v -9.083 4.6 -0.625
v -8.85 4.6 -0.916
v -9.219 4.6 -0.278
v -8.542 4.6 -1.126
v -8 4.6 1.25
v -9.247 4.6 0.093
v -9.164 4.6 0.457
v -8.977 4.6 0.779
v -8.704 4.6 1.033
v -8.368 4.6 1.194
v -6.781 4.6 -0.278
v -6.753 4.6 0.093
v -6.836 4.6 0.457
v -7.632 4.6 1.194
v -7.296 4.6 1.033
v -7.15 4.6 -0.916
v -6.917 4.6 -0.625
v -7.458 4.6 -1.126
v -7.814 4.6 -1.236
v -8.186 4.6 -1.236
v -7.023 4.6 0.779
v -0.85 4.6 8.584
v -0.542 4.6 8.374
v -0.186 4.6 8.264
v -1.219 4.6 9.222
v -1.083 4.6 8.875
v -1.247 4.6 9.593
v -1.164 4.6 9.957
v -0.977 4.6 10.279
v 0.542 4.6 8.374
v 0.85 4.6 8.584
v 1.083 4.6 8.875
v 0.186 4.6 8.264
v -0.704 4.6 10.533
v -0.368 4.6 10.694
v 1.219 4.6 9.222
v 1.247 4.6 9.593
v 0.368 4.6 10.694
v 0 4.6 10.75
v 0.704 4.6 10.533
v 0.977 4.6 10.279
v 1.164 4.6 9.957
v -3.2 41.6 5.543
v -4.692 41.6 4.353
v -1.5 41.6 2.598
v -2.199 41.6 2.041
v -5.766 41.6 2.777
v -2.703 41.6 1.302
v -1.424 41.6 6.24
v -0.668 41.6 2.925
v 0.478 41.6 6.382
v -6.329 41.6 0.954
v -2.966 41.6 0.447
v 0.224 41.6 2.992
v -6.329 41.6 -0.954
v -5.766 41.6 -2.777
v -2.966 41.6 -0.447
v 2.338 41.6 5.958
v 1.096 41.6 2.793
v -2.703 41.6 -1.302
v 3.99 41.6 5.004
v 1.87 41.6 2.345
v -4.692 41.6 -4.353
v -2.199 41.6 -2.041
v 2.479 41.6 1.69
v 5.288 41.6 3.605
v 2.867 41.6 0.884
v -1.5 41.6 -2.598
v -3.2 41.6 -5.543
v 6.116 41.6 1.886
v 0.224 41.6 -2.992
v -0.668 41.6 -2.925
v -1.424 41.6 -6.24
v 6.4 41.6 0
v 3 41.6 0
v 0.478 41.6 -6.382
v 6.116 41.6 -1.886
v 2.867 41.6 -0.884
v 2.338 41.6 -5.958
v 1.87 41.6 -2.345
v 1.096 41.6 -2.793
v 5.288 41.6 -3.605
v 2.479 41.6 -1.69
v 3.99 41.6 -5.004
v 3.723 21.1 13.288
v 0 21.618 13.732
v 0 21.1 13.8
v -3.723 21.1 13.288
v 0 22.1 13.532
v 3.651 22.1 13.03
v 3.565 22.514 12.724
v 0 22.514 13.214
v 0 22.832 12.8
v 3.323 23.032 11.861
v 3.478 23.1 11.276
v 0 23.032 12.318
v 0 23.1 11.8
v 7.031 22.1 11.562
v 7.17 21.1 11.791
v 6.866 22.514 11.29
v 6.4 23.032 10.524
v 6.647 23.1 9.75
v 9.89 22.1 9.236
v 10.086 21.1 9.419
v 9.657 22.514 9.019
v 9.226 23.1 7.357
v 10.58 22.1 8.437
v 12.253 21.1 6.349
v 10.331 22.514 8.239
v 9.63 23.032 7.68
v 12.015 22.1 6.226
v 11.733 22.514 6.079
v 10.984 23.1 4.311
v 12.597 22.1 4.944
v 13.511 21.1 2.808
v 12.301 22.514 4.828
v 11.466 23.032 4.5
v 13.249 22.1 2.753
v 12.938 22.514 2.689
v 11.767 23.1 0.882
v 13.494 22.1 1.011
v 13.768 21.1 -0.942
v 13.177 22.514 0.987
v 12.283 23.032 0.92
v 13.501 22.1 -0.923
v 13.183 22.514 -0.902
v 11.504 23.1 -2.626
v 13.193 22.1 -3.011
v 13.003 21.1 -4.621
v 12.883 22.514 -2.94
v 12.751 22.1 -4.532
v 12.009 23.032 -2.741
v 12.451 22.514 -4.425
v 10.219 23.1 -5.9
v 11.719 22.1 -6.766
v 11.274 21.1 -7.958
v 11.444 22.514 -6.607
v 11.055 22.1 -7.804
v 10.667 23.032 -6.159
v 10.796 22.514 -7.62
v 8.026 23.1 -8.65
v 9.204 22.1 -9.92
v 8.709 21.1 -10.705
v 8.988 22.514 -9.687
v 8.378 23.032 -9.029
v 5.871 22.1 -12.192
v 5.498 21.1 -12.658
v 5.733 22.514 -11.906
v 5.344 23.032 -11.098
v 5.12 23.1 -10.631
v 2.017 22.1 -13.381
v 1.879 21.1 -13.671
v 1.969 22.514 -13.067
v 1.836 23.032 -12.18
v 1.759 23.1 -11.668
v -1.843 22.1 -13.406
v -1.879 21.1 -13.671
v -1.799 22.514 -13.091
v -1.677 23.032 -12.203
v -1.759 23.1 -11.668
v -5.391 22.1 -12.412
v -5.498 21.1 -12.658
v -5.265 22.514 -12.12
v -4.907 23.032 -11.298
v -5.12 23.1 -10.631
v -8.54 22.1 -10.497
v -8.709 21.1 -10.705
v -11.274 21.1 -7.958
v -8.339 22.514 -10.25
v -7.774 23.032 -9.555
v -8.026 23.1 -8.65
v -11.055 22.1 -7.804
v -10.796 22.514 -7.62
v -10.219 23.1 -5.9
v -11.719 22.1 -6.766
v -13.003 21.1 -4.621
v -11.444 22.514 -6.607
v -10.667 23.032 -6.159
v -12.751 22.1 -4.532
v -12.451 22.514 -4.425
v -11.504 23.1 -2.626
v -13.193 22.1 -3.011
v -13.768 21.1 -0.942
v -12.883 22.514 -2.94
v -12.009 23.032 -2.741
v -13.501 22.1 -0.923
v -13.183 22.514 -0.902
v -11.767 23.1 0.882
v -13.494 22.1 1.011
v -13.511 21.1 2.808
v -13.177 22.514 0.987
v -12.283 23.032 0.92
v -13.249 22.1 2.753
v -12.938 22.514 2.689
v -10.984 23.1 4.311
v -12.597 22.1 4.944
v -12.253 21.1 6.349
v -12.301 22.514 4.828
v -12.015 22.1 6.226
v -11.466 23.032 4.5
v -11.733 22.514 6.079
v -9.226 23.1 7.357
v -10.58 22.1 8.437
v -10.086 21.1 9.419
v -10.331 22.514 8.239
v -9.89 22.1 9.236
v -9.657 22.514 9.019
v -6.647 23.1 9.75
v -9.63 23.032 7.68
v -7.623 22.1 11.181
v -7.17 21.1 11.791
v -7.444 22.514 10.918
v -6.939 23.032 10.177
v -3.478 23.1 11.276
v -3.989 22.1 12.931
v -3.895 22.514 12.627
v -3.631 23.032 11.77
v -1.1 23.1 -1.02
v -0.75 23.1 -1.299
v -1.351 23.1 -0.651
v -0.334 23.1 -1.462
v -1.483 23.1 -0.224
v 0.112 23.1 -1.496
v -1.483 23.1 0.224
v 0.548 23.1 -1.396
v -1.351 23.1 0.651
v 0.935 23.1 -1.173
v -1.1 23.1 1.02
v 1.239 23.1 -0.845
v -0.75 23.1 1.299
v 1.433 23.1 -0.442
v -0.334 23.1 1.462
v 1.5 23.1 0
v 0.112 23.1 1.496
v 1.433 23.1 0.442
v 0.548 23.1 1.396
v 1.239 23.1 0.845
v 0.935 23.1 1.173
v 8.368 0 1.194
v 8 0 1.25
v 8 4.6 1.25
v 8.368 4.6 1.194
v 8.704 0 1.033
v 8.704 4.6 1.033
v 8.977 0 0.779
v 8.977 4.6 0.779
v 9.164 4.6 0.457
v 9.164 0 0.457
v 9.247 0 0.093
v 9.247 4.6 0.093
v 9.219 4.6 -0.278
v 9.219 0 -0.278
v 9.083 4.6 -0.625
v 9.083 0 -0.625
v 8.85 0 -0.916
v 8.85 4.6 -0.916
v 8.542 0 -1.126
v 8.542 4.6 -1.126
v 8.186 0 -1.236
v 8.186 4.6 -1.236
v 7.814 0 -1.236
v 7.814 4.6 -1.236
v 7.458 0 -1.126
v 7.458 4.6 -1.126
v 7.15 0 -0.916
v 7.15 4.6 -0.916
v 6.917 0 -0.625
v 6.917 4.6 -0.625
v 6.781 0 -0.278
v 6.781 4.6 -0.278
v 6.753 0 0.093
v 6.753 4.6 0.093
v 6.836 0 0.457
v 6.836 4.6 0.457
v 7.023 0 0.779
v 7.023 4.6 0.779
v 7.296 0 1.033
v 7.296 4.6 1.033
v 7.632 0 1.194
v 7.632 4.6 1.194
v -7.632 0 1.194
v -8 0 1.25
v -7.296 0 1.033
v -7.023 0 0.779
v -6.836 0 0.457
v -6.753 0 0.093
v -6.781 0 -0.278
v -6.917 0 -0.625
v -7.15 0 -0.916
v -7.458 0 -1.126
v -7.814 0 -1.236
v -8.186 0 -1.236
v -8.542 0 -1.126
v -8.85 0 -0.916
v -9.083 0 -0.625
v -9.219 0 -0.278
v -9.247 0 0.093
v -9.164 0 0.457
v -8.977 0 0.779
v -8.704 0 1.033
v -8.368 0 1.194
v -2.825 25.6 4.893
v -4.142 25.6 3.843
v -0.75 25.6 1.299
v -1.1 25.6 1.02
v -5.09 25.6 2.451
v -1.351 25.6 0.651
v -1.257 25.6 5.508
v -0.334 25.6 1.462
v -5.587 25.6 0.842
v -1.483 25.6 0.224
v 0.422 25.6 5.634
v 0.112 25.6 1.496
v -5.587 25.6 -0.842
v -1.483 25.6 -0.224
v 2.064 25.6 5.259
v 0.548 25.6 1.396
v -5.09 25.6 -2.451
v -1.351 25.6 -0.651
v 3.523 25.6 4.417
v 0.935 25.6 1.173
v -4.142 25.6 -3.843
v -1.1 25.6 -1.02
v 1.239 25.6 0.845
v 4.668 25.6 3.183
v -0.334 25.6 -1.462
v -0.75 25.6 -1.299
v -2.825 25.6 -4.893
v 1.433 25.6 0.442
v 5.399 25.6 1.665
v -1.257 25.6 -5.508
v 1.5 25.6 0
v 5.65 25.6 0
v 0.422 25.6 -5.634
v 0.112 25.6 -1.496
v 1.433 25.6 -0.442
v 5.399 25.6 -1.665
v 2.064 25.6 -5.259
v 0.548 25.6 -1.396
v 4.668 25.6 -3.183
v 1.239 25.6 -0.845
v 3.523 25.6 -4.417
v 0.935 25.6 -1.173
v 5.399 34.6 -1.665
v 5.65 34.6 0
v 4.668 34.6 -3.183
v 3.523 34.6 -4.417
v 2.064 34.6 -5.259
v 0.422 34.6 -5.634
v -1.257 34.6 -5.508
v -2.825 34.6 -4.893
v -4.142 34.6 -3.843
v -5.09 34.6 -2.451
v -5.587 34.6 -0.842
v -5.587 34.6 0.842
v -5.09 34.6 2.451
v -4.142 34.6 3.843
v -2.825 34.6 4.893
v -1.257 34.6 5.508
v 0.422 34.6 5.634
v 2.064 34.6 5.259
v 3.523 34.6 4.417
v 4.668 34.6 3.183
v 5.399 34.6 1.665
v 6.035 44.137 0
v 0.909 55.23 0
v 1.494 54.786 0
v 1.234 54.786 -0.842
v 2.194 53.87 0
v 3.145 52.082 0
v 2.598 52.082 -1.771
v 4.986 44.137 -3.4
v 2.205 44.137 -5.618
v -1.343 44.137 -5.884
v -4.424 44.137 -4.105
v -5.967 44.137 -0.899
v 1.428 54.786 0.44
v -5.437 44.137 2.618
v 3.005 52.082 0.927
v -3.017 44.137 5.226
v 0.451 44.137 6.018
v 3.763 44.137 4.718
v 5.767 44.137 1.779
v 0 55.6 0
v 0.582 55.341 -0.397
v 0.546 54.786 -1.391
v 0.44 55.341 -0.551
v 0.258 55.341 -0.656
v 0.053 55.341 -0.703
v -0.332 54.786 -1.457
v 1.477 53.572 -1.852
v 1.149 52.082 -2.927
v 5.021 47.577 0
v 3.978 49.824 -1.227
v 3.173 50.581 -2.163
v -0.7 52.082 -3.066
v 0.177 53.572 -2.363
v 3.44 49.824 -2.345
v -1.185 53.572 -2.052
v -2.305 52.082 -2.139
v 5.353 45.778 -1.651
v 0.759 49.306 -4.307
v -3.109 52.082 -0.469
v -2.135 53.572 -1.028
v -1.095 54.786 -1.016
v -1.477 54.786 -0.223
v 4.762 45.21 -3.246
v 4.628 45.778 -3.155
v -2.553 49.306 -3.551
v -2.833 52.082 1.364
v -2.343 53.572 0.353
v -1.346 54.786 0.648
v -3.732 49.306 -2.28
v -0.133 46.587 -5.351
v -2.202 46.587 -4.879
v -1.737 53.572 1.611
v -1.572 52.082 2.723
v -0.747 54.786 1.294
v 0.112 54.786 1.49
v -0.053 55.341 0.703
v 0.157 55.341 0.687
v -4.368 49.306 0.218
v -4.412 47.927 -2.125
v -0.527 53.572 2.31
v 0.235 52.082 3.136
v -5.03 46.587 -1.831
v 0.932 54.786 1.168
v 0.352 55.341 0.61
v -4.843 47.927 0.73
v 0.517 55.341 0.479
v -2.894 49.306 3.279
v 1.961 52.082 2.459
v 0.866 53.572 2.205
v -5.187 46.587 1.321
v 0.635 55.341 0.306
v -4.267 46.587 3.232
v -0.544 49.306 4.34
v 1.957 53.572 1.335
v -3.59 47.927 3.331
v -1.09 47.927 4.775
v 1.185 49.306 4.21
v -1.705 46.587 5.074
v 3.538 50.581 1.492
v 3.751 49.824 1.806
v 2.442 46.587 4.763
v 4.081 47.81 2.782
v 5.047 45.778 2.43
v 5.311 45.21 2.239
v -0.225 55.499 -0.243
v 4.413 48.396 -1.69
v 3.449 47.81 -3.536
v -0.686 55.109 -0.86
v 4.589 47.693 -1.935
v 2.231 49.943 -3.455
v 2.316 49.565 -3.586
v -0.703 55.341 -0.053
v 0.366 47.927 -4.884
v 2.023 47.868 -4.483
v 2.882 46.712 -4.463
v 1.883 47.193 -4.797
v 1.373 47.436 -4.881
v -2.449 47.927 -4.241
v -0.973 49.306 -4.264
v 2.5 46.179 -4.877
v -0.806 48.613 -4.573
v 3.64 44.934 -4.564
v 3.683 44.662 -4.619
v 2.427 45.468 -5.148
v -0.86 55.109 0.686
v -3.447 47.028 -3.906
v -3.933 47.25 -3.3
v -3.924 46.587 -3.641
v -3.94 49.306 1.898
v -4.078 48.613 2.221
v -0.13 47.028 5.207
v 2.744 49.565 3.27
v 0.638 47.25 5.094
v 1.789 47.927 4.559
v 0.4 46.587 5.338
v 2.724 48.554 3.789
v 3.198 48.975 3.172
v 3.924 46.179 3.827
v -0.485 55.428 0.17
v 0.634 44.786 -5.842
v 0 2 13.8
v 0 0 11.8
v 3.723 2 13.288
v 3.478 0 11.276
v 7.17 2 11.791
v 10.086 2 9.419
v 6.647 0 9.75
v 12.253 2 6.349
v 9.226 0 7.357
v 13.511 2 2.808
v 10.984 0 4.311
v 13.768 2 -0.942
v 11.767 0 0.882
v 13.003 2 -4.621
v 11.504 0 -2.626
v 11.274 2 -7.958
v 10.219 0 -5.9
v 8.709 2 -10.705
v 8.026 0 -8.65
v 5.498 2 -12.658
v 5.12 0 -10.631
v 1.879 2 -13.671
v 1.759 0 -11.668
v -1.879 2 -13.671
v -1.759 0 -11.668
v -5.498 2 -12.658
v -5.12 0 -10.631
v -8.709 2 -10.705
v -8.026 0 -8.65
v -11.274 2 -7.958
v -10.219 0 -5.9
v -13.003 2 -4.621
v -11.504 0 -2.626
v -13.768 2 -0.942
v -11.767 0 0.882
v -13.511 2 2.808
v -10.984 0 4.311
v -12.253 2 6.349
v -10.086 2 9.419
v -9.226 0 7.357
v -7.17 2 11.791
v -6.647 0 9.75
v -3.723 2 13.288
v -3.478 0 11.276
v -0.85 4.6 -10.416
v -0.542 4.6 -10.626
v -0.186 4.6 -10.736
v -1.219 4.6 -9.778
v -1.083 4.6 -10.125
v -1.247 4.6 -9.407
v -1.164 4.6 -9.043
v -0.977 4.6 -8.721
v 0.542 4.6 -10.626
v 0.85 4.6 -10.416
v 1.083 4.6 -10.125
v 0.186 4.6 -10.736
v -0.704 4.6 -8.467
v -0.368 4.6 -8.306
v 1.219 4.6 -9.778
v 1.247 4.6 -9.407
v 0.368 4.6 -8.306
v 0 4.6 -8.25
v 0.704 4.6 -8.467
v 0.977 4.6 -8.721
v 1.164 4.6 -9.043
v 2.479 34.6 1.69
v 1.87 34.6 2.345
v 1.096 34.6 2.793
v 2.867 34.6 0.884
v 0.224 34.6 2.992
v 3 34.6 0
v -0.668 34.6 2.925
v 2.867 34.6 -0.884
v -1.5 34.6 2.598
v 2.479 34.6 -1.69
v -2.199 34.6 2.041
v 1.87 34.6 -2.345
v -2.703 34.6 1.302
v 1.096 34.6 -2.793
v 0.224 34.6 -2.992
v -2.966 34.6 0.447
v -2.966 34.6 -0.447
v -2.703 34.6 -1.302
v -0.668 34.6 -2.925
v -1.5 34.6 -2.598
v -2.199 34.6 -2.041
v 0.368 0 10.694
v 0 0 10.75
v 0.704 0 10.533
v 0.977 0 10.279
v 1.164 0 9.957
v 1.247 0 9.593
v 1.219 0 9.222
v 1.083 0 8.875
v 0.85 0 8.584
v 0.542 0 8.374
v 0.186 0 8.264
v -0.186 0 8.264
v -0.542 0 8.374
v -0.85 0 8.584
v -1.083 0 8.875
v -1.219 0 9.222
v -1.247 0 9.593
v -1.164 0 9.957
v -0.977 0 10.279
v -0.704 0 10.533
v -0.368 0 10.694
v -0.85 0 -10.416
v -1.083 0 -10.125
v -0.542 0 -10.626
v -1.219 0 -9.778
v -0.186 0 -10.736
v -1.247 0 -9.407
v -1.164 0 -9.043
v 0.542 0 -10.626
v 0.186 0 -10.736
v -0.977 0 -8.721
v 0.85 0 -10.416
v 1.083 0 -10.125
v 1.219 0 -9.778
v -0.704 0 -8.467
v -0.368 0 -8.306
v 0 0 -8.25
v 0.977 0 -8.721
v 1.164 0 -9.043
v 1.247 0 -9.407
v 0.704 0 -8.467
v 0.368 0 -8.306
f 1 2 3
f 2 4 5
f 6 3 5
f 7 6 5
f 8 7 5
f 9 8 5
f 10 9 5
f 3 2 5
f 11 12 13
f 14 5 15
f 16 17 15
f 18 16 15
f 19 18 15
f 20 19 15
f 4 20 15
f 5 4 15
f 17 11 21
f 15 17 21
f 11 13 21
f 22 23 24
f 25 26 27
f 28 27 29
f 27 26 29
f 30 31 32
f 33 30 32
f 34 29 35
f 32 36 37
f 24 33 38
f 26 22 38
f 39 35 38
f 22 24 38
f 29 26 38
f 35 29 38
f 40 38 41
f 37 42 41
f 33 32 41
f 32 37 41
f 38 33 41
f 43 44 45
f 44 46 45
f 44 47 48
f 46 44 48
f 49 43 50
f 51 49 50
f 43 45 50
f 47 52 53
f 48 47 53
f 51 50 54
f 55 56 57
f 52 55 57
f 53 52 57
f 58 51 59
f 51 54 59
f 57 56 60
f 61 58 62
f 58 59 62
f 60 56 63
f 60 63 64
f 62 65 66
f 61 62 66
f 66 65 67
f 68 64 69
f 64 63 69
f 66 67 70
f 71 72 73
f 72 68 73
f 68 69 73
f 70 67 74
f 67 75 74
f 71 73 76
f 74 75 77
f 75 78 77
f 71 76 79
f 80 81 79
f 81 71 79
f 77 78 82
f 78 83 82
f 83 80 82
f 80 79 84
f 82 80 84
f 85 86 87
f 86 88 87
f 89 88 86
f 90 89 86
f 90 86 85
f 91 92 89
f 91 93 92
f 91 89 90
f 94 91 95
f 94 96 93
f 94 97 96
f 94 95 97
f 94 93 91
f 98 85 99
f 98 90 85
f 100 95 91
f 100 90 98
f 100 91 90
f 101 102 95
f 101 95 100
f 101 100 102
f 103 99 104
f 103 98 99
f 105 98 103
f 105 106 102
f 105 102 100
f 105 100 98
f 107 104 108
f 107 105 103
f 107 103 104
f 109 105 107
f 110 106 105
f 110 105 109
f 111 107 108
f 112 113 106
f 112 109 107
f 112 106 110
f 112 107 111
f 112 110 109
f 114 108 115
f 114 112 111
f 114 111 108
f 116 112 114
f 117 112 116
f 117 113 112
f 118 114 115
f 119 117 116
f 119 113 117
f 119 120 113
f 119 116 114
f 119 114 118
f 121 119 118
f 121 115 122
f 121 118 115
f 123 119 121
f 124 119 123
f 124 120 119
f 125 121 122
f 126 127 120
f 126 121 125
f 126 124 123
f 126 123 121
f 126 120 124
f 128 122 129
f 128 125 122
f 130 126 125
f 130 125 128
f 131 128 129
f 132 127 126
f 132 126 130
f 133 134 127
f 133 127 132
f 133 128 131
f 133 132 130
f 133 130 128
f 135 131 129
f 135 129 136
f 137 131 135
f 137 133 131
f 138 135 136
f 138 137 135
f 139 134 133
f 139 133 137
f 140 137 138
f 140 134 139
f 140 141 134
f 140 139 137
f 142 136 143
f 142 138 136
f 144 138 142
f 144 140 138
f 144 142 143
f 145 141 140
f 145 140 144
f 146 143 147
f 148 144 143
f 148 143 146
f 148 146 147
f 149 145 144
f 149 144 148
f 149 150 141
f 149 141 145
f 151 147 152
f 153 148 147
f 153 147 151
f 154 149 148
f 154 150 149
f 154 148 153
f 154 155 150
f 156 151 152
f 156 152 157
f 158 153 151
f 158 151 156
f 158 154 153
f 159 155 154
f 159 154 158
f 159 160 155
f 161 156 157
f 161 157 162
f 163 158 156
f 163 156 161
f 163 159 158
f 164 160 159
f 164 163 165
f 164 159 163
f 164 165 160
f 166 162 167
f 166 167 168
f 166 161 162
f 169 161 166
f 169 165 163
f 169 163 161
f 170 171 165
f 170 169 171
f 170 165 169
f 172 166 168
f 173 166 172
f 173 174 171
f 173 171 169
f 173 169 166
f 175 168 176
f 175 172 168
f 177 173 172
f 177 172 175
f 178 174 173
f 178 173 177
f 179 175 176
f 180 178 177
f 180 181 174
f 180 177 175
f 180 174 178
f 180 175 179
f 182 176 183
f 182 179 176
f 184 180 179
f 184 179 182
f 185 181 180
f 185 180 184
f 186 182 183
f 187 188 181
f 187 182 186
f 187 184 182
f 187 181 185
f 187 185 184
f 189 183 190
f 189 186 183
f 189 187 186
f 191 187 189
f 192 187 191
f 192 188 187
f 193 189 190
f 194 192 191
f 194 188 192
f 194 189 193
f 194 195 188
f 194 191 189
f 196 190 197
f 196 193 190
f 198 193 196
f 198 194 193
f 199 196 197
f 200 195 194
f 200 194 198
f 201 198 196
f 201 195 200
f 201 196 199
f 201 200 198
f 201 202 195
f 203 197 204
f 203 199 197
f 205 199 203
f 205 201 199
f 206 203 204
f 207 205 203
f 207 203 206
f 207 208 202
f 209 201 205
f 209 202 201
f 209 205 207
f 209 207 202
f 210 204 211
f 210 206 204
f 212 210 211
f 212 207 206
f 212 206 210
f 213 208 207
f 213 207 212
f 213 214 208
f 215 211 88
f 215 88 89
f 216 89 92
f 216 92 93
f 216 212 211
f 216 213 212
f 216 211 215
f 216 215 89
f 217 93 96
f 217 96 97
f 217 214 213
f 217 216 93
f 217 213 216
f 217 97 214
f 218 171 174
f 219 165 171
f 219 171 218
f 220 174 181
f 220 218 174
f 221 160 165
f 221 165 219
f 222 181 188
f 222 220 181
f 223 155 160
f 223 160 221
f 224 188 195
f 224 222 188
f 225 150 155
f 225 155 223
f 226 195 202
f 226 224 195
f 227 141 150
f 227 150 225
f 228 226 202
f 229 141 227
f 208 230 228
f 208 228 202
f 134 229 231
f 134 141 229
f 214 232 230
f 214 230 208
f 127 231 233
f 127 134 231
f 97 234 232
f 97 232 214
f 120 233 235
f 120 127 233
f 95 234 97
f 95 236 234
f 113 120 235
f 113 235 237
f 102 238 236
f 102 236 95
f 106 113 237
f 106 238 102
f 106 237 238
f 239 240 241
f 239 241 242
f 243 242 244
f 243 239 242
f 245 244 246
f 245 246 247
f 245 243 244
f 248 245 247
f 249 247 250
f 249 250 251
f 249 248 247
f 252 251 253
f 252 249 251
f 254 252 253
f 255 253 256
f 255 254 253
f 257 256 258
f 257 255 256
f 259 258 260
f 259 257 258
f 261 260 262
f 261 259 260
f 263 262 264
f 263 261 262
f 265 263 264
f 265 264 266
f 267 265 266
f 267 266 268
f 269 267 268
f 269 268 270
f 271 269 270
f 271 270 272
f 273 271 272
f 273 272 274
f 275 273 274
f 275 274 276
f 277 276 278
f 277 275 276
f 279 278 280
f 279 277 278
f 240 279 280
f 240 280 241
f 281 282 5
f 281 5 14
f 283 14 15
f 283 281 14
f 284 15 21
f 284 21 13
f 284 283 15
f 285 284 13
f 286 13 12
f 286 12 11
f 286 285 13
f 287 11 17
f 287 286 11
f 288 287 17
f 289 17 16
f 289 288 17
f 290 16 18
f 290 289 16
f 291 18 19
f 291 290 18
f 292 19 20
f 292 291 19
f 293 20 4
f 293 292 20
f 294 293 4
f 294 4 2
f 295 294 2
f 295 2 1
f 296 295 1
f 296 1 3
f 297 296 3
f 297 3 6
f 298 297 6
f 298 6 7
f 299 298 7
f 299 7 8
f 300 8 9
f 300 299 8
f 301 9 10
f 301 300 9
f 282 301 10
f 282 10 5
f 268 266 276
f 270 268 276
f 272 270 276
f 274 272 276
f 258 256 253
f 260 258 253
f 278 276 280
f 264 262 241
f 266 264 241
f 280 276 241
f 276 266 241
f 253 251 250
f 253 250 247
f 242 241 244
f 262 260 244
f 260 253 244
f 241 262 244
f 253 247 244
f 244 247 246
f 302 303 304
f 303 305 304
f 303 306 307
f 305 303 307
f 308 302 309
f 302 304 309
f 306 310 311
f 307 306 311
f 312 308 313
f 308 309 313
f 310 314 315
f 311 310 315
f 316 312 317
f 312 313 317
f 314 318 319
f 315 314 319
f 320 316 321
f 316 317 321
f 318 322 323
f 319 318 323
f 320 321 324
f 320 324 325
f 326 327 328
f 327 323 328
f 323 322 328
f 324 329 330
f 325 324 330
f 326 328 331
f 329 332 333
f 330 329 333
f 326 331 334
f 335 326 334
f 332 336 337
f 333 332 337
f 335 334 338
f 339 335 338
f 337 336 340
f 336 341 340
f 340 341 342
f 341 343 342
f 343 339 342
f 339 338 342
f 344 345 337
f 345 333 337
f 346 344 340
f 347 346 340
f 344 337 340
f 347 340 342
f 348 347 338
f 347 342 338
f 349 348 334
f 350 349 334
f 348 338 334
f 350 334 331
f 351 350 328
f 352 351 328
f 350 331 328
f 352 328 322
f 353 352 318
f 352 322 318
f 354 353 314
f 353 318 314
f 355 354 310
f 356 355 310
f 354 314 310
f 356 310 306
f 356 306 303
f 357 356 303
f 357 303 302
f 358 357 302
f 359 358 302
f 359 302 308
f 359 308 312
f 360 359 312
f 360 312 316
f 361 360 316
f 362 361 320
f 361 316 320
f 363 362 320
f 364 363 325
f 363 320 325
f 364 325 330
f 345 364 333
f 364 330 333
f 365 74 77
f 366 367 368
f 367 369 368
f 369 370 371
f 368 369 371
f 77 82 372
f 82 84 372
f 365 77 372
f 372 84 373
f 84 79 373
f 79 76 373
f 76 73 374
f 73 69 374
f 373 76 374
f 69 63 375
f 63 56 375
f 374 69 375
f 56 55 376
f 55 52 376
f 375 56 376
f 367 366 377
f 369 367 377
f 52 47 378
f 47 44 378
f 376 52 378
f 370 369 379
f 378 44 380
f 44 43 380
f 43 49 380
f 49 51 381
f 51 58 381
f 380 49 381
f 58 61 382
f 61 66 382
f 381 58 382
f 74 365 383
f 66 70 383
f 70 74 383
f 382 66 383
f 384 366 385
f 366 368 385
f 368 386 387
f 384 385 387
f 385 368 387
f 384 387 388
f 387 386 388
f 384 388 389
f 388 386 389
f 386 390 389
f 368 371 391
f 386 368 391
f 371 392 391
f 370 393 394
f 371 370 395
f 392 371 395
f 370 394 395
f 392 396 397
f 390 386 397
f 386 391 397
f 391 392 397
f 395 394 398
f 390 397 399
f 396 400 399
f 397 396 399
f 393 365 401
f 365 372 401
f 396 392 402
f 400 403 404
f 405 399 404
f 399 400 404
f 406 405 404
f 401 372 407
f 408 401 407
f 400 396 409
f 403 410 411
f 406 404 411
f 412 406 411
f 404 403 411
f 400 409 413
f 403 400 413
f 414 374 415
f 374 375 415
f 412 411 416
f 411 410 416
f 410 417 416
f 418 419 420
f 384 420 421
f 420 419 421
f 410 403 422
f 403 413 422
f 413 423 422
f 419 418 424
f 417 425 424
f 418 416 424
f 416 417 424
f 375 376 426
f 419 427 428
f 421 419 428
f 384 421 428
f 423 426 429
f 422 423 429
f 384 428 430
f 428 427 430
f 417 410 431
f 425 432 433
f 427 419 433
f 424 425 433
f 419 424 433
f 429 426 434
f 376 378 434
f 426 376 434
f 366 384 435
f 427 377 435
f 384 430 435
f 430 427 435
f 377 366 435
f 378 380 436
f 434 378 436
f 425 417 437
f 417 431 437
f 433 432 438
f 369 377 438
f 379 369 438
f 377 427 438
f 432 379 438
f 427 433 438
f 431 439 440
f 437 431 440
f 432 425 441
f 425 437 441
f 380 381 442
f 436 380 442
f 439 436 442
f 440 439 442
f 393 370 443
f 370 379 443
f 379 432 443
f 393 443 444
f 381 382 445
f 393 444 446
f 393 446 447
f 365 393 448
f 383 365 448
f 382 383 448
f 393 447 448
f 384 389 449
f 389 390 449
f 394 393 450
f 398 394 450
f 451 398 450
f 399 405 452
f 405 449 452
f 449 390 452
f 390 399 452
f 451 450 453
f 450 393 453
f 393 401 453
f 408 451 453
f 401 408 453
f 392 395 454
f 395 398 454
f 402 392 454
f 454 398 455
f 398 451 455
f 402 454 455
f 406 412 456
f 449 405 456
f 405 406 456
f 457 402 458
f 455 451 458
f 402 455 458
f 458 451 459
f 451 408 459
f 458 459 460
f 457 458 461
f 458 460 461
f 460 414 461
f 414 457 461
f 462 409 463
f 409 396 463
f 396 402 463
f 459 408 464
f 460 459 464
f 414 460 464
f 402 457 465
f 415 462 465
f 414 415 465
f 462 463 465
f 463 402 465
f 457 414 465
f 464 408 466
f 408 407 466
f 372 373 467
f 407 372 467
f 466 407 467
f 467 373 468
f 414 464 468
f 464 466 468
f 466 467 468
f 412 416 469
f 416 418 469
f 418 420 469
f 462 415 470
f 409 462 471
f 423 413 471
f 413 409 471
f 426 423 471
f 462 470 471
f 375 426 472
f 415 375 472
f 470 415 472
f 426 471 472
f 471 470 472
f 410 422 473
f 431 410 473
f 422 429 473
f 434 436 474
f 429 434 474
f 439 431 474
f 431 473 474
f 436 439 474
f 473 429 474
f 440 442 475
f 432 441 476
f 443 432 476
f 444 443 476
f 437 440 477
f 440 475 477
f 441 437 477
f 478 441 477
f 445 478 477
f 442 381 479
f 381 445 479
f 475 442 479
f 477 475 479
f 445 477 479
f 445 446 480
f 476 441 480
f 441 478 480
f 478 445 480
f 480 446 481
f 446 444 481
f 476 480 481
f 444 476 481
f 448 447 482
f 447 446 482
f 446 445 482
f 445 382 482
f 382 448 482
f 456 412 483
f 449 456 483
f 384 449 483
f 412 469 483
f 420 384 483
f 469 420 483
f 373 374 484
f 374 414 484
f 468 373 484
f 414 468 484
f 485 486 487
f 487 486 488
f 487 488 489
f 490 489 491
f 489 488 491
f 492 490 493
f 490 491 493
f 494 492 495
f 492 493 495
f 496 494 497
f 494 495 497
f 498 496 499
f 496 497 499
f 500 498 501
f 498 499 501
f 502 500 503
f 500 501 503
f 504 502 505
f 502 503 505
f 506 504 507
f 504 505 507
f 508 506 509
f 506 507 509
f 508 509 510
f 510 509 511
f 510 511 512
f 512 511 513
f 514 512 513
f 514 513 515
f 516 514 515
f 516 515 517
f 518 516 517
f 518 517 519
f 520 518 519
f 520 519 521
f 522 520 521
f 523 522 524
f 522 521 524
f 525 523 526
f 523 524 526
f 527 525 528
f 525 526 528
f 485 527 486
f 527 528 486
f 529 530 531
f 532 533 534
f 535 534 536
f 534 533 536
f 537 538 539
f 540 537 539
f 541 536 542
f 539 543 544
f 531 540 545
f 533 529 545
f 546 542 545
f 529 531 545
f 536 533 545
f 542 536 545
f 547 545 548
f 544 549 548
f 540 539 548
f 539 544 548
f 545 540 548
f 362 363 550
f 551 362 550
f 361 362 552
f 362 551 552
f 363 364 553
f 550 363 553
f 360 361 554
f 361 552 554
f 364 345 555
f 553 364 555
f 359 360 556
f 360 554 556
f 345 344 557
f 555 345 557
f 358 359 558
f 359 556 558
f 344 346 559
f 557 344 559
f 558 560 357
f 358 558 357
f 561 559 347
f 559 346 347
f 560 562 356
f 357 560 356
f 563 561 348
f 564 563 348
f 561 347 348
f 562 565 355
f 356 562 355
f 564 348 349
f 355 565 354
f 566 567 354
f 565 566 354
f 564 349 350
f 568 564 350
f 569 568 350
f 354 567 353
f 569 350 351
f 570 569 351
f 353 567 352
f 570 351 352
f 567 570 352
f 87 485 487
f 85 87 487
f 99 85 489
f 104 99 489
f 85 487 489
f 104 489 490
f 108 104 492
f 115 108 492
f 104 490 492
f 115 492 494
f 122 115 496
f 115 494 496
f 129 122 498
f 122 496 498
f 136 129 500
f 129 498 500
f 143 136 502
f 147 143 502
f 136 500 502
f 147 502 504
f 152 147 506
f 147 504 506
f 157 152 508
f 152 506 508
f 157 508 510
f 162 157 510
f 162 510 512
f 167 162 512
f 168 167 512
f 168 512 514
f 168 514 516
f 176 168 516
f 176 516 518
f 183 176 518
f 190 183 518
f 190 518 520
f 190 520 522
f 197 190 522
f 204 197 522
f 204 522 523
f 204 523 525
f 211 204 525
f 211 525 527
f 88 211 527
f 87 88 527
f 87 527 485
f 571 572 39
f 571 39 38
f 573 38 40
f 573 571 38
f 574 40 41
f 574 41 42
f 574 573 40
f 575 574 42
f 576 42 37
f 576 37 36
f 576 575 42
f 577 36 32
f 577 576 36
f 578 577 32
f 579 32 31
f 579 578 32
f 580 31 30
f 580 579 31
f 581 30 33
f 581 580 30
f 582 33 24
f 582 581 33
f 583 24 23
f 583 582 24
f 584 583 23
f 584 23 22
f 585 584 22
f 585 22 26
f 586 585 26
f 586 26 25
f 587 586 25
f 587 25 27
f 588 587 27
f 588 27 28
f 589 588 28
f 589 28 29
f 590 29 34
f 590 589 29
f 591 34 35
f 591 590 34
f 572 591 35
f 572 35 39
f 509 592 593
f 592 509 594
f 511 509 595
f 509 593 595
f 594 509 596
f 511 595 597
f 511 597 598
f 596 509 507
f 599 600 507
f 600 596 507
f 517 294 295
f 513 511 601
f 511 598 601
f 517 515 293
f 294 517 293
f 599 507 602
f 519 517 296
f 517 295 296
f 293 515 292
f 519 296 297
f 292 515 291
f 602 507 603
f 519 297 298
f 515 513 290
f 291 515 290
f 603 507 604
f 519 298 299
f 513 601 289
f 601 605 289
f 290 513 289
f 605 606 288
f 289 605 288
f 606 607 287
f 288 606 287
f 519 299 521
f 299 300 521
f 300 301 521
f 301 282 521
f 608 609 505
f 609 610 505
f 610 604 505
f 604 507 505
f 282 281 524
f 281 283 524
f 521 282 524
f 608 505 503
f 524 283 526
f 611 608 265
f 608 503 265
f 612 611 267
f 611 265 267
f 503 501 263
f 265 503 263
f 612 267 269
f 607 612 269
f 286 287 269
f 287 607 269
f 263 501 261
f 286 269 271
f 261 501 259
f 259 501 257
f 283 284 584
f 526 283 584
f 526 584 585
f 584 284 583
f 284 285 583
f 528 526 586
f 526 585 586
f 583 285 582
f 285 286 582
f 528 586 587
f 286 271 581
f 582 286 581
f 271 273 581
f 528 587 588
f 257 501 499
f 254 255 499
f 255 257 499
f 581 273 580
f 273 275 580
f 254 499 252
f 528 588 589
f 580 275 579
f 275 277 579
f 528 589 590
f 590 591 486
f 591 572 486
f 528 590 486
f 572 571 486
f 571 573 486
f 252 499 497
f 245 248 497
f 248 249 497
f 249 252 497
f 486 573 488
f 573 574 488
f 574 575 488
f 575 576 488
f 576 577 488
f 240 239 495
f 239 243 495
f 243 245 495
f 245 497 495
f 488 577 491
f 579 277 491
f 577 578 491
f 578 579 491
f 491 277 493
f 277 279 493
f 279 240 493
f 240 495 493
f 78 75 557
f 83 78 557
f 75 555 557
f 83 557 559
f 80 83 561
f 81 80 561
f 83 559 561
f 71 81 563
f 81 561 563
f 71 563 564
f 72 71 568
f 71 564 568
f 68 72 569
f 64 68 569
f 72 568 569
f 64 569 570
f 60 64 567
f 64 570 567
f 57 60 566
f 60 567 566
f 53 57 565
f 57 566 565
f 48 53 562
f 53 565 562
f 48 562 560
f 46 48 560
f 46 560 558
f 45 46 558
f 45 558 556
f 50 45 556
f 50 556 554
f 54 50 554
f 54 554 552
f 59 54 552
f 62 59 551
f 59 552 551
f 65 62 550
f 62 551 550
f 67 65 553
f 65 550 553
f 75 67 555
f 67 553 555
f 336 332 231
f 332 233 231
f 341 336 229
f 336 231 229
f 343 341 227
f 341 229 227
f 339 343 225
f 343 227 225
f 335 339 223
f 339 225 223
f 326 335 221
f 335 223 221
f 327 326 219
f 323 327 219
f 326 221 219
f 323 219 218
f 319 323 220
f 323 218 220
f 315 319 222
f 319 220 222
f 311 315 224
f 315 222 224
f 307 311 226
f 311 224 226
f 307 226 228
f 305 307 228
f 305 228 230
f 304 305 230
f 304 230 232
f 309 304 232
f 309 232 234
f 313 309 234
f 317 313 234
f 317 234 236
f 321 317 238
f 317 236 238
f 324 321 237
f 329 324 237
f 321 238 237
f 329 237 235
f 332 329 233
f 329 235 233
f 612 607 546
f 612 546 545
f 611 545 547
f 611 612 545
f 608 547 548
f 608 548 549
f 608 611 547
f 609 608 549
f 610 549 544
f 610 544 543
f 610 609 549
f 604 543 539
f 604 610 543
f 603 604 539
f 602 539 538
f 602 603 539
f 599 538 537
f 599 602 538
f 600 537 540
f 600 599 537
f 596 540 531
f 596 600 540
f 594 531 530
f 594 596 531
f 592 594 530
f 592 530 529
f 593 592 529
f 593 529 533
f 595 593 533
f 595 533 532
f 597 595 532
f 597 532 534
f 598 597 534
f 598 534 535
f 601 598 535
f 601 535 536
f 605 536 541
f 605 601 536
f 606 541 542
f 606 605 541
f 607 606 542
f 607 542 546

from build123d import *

# Parameters (mm, degrees)
SKETCH_1_R      = 13.8
SKETCH_1_R_2    = 1.25
EXTRUDE_1_DEPTH = 4.6
SKETCH_2_R      = 13.8
EXTRUDE_2_DEPTH = 18.5
FILLET_1_R      = 2
CHAMFER_1_SIZE  = 2


with BuildPart() as part:
    # 草圖1 → 填料-伸長1 (new body)
    with BuildSketch(Plane(origin=(0, 0, 0), x_dir=(1, 0, 0), z_dir=(0, 1, 0))):
        with Locations(Location((0, 0, 0), (0, 0, 270))):
            Circle(SKETCH_1_R)
        with Locations(Location((0, 9.5, 0), (0, 0, 270))):
            Circle(SKETCH_1_R_2, mode=Mode.SUBTRACT)
        with Locations(Location((0, -9.5, 0), (0, 0, 270))):
            Circle(SKETCH_1_R_2, mode=Mode.SUBTRACT)
        with Locations(Location((8, 0, 0), (0, 0, 270))):
            Circle(SKETCH_1_R_2, mode=Mode.SUBTRACT)
        with Locations(Location((-8, 0, 0), (0, 0, 270))):
            Circle(SKETCH_1_R_2, mode=Mode.SUBTRACT)
    extrude(amount=EXTRUDE_1_DEPTH)

    # 草圖2 → 填料-伸長2 (add)
    with BuildSketch(Plane(origin=(0, 4.6, 0), x_dir=(1, 0, 0), z_dir=(0, 1, 0))):
        with Locations(Location((0, 0, 0), (0, 0, 270))):
            Circle(SKETCH_2_R)
    extrude(amount=EXTRUDE_2_DEPTH)

    # 圓角1
    fillet_1_edges = [part.edges().sort_by_distance(p)[0] for p in [
        (0, 23.1, -13.8),
    ]]
    fillet(fillet_1_edges, radius=FILLET_1_R)

    # 草圖5 → 旋轉1 (revolve)
    with BuildSketch(Plane.XY, mode=Mode.PRIVATE) as revolve_1_sk:
        with BuildLine():
            Line((0, 23.1), (0, 55.6))
            add(Edge.make_bspline(
                [(0, 55.6), (-0.448143347, 55.484061035), (-1.523316828, 55.079878449), (-4.652306248, 49.57128747), (-6.4, 43.797195066), (-6.4, 41.6)],
                knots=[0, 0, 0, 0, 0.157070914, 0.257070914, 1, 1, 1, 1], degree=3))
            Line((-6.4, 41.6), (-3, 41.6))
            Line((-3, 41.6), (-3, 34.6))
            Line((-3, 34.6), (-5.65, 34.6))
            Line((-5.65, 34.6), (-5.65, 25.6))
            Line((-5.65, 25.6), (-1.5, 25.6))
            Line((-1.5, 25.6), (-1.5, 23.1))
            Line((-1.5, 23.1), (0, 23.1))
        make_face()
    revolve(revolve_1_sk.sketch.rotate(Axis((0, 23.1, 0), (0, 1, 0)), 180), axis=Axis((0, 23.1, 0), (0, 1, 0)))

    # 導角1
    chamfer_1_edges = [part.edges().sort_by_distance(p)[0] for p in [
        (0, 0, -13.8),
    ]]
    chamfer(chamfer_1_edges, length=CHAMFER_1_SIZE)


solid = part.part
